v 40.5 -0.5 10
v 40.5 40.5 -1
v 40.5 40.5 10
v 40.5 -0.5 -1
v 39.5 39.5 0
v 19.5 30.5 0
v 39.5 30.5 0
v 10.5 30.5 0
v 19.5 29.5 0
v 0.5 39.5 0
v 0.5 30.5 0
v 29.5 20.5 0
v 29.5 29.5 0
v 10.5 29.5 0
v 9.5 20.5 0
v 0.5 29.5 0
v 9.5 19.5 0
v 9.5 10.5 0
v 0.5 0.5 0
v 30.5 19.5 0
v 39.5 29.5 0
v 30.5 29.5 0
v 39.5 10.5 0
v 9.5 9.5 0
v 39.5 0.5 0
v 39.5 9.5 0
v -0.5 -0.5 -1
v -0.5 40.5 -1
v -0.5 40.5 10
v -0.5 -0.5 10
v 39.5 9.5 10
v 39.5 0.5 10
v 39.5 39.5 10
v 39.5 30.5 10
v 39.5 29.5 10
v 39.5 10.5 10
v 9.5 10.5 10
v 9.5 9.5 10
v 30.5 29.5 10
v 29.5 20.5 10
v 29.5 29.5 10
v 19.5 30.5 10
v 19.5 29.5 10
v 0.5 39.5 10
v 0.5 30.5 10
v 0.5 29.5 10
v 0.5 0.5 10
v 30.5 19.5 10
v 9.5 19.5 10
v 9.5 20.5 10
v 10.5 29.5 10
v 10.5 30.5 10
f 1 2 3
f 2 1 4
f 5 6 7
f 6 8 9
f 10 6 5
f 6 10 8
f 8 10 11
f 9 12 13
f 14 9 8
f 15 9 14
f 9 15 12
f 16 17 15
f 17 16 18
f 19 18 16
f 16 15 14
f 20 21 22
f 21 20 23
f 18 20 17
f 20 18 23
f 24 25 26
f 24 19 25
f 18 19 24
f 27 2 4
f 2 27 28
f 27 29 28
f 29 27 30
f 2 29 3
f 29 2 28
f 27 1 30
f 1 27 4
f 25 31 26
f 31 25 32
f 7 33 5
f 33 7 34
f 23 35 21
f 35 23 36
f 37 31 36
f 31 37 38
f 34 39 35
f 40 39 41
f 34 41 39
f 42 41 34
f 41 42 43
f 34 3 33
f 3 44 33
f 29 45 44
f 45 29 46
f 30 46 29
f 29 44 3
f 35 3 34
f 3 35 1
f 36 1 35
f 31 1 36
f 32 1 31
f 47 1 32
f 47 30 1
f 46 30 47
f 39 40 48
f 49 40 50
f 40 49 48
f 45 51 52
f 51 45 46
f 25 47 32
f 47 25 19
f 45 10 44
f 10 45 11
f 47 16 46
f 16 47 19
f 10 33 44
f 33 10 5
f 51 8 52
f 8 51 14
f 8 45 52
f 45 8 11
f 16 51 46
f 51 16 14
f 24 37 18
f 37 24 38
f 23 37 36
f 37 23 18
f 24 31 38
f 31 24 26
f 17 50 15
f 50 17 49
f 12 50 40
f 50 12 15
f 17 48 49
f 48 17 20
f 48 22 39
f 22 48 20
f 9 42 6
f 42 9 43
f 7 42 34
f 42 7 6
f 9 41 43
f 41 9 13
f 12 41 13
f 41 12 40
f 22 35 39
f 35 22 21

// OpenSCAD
// base plate 
 translate([-0.5,-0.5,-1]){ 
 cube([41,41,1], center=false); 
 }  
// borders  
 translate([-0.5,-0.5,0]){ 
 cube([40,1,10], center=false); 
 } 
 translate([-0.5,-0.5,0]){ 
 cube([1,40,10], center=false); 
 } 
translate([-0.5,39.5,0]){ 
 cube([41,1,10], center=false); 
 } 
 translate([39.5,-0.5,0]){ 
 cube([1,41,10], center=false); 
 } 
 
 //interior walls 
 translate([5.0,30,5.0]){  
 cube([11,1,10], center=true); 
 } 
translate([15.0,10,5.0]){  
 cube([11,1,10], center=true); 
 } 
translate([15.0,20,5.0]){  
 cube([11,1,10], center=true); 
 } 
translate([25.0,10,5.0]){  
 cube([11,1,10], center=true); 
 } 
translate([25.0,20,5.0]){  
 cube([11,1,10], center=true); 
 } 
translate([25.0,30,5.0]){  
 cube([11,1,10], center=true); 
 } 
translate([35.0,10,5.0]){  
 cube([11,1,10], center=true); 
 } 
translate([35.0,30,5.0]){  
 cube([11,1,10], center=true); 
 } 
translate([30,25.0,5.0]){  
 rotate([0,0,90]){ 
 cube([11,1,10], center=true); 
 } 
 } 
